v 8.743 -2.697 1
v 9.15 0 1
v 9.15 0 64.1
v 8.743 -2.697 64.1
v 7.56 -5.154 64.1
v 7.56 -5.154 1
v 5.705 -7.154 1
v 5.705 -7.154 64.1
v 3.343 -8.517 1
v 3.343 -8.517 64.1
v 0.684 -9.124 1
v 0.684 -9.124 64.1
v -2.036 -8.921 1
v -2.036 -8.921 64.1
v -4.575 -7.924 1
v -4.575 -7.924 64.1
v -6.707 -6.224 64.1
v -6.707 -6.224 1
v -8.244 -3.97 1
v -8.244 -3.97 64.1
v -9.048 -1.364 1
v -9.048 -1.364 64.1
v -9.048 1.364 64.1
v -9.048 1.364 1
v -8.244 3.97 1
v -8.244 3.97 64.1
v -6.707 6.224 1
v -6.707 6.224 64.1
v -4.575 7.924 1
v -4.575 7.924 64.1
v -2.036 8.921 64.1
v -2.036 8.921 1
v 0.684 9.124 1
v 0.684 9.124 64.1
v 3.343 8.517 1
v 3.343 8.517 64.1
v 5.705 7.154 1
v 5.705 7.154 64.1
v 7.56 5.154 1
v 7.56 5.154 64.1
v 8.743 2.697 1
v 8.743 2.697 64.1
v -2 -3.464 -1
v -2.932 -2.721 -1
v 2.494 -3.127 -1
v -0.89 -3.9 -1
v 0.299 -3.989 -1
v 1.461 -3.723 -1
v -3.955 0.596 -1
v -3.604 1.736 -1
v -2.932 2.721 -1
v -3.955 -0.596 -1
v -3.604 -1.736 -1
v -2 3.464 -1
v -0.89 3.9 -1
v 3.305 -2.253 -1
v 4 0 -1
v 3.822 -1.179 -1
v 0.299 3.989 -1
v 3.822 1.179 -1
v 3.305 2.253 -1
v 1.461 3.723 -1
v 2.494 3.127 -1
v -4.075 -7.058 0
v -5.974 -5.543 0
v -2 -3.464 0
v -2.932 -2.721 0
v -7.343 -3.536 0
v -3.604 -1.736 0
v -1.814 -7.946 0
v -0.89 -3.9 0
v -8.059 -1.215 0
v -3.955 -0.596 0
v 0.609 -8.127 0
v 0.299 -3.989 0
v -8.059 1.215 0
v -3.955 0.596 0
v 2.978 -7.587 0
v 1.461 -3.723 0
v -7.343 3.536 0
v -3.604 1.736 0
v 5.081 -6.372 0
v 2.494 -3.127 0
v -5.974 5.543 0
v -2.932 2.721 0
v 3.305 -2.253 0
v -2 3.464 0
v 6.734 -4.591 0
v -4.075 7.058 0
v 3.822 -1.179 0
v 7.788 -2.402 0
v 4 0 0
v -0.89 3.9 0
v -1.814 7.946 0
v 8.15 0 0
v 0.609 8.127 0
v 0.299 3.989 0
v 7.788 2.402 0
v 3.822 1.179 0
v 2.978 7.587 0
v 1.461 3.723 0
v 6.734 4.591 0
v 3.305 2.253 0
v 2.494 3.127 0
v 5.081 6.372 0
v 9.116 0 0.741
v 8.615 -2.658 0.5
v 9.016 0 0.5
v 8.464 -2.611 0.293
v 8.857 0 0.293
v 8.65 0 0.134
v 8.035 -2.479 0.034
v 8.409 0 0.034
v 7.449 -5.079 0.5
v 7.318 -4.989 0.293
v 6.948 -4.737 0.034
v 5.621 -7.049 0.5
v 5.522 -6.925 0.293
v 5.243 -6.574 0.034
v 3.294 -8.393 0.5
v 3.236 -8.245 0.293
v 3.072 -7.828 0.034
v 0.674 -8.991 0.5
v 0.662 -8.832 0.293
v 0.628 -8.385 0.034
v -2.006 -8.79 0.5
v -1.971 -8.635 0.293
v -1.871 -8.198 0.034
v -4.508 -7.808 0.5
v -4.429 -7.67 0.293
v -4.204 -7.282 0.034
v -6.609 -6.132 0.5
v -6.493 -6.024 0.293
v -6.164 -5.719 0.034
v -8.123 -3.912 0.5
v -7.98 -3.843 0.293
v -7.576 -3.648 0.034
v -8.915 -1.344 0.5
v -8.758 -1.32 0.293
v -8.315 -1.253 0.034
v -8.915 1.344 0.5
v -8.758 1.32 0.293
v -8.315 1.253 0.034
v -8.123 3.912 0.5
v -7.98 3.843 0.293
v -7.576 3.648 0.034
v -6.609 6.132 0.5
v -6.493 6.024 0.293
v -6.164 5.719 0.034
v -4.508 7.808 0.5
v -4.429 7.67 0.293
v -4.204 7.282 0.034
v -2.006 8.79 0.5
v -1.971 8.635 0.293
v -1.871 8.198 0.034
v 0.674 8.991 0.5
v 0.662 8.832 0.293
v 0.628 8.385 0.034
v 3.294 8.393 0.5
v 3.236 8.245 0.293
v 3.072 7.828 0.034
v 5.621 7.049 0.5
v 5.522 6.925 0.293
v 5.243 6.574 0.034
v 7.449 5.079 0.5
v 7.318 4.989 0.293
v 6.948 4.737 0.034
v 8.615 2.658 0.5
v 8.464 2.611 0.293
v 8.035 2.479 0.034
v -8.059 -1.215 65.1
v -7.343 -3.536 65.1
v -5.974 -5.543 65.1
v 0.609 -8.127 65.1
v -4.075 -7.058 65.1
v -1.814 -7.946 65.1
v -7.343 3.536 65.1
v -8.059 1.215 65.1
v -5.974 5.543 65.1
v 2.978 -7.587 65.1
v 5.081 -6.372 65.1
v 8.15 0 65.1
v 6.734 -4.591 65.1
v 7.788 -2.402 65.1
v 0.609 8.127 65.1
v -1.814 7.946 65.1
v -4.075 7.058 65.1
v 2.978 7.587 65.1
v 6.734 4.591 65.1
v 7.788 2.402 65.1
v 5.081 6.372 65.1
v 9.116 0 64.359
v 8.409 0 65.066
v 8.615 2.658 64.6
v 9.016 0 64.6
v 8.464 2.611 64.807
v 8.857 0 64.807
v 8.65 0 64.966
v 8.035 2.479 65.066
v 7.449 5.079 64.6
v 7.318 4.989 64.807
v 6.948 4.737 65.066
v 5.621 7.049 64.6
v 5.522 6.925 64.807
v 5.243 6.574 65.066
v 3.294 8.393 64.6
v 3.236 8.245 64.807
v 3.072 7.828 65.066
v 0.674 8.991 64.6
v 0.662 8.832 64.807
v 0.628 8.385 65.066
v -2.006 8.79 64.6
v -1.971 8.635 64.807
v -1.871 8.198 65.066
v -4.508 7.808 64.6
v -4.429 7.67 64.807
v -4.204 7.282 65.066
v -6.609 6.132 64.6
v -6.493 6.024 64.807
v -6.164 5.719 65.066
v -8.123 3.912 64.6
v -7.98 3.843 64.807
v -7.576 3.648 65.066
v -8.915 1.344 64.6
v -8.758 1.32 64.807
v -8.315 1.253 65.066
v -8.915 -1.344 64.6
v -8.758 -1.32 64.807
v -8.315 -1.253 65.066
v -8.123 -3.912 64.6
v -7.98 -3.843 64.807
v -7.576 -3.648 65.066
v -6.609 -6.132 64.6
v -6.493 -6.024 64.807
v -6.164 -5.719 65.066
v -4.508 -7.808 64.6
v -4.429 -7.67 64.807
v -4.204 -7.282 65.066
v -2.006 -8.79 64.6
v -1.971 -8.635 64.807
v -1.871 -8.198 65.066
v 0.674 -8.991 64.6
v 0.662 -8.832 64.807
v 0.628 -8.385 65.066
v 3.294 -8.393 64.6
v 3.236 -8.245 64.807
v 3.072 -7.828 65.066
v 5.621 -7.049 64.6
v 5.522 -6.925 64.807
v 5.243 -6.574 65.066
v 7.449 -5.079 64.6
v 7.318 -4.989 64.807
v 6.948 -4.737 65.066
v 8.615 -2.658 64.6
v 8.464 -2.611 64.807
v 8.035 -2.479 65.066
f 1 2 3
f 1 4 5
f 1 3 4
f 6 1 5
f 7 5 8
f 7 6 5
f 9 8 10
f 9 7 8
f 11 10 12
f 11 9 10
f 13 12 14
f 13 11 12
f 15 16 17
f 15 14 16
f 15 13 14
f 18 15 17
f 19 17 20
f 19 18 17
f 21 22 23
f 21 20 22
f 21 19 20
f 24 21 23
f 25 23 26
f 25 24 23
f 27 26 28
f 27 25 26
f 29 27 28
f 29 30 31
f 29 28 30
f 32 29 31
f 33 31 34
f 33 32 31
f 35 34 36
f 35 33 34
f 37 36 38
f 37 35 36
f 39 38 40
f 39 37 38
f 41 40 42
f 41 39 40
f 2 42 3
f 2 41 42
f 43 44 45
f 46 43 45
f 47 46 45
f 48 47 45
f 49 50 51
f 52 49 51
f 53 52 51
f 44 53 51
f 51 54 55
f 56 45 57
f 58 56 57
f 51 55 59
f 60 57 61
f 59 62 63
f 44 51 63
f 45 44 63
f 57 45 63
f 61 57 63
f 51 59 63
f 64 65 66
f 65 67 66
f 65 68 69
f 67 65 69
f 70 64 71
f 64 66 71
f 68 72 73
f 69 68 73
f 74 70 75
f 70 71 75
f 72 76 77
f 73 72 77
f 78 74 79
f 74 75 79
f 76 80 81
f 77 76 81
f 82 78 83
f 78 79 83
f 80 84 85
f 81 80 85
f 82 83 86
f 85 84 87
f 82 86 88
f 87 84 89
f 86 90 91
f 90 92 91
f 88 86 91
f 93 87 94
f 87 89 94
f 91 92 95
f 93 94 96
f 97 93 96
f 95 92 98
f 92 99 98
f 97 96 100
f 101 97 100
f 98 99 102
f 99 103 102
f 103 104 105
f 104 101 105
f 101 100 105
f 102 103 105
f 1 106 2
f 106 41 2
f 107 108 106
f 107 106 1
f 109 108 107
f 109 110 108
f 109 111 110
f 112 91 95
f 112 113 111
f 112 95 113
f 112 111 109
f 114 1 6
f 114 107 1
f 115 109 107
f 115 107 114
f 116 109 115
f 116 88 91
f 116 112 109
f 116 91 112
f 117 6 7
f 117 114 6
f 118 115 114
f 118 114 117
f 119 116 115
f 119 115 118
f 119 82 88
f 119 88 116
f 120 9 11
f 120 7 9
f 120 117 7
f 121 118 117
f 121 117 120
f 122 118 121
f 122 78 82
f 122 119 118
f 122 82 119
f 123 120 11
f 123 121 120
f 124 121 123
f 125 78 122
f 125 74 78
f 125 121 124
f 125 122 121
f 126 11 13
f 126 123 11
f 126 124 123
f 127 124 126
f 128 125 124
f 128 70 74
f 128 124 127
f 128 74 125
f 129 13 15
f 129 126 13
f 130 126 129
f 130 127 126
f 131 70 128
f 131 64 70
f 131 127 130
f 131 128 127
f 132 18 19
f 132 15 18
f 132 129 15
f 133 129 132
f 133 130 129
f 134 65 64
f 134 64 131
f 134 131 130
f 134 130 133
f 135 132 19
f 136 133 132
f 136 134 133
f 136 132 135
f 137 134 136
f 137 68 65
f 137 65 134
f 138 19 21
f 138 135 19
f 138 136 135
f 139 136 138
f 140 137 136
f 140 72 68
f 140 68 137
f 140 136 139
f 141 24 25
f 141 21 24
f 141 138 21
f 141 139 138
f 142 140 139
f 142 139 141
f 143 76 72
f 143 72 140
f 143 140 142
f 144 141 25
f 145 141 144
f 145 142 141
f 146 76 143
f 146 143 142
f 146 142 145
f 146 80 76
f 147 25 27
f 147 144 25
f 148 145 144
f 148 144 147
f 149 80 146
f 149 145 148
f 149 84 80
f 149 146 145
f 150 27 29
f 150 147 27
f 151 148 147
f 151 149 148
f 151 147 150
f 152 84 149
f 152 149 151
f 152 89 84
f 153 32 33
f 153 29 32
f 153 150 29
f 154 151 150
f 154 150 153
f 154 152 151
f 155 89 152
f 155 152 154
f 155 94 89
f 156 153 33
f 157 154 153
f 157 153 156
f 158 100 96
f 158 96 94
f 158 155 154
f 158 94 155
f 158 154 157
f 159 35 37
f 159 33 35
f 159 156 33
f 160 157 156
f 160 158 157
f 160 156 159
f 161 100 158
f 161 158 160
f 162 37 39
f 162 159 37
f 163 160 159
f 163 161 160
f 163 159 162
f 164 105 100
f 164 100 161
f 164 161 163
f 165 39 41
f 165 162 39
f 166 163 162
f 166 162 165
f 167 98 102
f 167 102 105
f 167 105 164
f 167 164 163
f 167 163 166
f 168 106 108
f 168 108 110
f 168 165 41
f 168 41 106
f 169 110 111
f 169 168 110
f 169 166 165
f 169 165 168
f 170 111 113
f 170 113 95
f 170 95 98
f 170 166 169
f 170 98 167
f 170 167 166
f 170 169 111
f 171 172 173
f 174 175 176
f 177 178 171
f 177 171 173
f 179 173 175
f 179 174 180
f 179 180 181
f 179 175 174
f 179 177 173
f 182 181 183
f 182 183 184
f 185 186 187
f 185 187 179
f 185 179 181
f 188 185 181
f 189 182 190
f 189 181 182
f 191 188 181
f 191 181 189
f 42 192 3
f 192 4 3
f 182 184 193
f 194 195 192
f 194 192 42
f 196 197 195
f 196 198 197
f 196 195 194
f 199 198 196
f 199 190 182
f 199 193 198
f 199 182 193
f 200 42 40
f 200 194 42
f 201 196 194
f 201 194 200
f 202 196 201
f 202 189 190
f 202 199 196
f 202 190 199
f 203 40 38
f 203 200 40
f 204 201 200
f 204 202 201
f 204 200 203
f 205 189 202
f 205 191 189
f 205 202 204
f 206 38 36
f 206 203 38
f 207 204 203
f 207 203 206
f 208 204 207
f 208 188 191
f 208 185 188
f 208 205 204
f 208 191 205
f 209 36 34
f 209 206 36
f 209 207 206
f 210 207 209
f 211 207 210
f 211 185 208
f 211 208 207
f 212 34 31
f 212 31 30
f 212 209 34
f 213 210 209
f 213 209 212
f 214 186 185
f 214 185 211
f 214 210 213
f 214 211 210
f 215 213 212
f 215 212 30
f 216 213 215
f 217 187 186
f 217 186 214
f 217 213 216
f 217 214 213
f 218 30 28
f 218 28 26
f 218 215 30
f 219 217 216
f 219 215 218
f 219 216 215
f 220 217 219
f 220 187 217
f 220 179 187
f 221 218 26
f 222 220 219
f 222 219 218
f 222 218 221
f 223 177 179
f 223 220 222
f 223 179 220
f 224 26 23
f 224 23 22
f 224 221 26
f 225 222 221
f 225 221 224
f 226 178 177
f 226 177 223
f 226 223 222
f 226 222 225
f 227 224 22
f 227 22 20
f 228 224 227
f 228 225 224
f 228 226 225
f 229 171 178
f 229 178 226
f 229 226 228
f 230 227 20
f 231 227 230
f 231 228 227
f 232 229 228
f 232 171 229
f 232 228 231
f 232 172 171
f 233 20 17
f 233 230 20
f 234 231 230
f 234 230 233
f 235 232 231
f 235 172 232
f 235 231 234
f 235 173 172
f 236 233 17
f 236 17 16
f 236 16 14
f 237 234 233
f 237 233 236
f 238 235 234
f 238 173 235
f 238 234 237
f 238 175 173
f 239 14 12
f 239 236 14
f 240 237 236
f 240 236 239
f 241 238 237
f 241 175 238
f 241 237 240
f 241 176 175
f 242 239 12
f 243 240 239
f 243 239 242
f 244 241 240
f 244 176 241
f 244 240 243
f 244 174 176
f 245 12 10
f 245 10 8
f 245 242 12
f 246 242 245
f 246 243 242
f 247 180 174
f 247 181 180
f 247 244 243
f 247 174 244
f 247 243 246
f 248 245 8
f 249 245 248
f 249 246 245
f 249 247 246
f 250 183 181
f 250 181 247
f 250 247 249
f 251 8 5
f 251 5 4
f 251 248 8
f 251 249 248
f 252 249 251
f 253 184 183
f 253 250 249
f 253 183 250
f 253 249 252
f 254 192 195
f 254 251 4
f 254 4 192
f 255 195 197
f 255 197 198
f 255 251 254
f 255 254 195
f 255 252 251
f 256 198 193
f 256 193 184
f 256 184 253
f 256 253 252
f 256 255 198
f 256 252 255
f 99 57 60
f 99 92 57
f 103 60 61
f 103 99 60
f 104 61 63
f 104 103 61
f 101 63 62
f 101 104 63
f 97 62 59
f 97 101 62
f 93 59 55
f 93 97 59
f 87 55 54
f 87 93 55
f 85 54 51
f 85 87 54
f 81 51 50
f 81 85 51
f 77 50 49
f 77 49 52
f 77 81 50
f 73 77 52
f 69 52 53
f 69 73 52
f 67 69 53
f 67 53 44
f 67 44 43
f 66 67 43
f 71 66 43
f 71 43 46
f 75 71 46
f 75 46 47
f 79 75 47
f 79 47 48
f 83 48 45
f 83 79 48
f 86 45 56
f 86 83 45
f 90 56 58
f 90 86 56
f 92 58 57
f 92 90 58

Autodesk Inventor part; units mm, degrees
ref_plane "YZ Plane" through (0, 0, 0) normal (1, 0, 0) x (0, 1, 0)
ref_plane "XZ Plane" through (0, 0, 0) normal (0, 1, 0) x (-1, 0, 0)
ref_plane "XY Plane" through (0, 0, 0) normal (0, 0, 1) x (1, 0, 0)
sketch "Skizze1" plane through (0, 0, 0) normal (0, 0, 1) x (1, 0, 0)
  circle A0 centre (0, 0) radius 9.15
  circle A1 centre (0, 0) radius 4
  dimension "d0" = 18.3
  dimension "d3" = 8
extrude "Extrusion1" add sketch "Skizze1" along normal blind 65.1 contours A0 | A1
extrude "Extrusion2" add sketch "Skizze1" against normal blind 1 contours A1
fillet "Rundung1" radius 1 2 edges at (-9.15, 0, 0) (-9.15, 0, 65.1)
properties part number "LG INR18650MJ1" material "Kupfer, Guss"
